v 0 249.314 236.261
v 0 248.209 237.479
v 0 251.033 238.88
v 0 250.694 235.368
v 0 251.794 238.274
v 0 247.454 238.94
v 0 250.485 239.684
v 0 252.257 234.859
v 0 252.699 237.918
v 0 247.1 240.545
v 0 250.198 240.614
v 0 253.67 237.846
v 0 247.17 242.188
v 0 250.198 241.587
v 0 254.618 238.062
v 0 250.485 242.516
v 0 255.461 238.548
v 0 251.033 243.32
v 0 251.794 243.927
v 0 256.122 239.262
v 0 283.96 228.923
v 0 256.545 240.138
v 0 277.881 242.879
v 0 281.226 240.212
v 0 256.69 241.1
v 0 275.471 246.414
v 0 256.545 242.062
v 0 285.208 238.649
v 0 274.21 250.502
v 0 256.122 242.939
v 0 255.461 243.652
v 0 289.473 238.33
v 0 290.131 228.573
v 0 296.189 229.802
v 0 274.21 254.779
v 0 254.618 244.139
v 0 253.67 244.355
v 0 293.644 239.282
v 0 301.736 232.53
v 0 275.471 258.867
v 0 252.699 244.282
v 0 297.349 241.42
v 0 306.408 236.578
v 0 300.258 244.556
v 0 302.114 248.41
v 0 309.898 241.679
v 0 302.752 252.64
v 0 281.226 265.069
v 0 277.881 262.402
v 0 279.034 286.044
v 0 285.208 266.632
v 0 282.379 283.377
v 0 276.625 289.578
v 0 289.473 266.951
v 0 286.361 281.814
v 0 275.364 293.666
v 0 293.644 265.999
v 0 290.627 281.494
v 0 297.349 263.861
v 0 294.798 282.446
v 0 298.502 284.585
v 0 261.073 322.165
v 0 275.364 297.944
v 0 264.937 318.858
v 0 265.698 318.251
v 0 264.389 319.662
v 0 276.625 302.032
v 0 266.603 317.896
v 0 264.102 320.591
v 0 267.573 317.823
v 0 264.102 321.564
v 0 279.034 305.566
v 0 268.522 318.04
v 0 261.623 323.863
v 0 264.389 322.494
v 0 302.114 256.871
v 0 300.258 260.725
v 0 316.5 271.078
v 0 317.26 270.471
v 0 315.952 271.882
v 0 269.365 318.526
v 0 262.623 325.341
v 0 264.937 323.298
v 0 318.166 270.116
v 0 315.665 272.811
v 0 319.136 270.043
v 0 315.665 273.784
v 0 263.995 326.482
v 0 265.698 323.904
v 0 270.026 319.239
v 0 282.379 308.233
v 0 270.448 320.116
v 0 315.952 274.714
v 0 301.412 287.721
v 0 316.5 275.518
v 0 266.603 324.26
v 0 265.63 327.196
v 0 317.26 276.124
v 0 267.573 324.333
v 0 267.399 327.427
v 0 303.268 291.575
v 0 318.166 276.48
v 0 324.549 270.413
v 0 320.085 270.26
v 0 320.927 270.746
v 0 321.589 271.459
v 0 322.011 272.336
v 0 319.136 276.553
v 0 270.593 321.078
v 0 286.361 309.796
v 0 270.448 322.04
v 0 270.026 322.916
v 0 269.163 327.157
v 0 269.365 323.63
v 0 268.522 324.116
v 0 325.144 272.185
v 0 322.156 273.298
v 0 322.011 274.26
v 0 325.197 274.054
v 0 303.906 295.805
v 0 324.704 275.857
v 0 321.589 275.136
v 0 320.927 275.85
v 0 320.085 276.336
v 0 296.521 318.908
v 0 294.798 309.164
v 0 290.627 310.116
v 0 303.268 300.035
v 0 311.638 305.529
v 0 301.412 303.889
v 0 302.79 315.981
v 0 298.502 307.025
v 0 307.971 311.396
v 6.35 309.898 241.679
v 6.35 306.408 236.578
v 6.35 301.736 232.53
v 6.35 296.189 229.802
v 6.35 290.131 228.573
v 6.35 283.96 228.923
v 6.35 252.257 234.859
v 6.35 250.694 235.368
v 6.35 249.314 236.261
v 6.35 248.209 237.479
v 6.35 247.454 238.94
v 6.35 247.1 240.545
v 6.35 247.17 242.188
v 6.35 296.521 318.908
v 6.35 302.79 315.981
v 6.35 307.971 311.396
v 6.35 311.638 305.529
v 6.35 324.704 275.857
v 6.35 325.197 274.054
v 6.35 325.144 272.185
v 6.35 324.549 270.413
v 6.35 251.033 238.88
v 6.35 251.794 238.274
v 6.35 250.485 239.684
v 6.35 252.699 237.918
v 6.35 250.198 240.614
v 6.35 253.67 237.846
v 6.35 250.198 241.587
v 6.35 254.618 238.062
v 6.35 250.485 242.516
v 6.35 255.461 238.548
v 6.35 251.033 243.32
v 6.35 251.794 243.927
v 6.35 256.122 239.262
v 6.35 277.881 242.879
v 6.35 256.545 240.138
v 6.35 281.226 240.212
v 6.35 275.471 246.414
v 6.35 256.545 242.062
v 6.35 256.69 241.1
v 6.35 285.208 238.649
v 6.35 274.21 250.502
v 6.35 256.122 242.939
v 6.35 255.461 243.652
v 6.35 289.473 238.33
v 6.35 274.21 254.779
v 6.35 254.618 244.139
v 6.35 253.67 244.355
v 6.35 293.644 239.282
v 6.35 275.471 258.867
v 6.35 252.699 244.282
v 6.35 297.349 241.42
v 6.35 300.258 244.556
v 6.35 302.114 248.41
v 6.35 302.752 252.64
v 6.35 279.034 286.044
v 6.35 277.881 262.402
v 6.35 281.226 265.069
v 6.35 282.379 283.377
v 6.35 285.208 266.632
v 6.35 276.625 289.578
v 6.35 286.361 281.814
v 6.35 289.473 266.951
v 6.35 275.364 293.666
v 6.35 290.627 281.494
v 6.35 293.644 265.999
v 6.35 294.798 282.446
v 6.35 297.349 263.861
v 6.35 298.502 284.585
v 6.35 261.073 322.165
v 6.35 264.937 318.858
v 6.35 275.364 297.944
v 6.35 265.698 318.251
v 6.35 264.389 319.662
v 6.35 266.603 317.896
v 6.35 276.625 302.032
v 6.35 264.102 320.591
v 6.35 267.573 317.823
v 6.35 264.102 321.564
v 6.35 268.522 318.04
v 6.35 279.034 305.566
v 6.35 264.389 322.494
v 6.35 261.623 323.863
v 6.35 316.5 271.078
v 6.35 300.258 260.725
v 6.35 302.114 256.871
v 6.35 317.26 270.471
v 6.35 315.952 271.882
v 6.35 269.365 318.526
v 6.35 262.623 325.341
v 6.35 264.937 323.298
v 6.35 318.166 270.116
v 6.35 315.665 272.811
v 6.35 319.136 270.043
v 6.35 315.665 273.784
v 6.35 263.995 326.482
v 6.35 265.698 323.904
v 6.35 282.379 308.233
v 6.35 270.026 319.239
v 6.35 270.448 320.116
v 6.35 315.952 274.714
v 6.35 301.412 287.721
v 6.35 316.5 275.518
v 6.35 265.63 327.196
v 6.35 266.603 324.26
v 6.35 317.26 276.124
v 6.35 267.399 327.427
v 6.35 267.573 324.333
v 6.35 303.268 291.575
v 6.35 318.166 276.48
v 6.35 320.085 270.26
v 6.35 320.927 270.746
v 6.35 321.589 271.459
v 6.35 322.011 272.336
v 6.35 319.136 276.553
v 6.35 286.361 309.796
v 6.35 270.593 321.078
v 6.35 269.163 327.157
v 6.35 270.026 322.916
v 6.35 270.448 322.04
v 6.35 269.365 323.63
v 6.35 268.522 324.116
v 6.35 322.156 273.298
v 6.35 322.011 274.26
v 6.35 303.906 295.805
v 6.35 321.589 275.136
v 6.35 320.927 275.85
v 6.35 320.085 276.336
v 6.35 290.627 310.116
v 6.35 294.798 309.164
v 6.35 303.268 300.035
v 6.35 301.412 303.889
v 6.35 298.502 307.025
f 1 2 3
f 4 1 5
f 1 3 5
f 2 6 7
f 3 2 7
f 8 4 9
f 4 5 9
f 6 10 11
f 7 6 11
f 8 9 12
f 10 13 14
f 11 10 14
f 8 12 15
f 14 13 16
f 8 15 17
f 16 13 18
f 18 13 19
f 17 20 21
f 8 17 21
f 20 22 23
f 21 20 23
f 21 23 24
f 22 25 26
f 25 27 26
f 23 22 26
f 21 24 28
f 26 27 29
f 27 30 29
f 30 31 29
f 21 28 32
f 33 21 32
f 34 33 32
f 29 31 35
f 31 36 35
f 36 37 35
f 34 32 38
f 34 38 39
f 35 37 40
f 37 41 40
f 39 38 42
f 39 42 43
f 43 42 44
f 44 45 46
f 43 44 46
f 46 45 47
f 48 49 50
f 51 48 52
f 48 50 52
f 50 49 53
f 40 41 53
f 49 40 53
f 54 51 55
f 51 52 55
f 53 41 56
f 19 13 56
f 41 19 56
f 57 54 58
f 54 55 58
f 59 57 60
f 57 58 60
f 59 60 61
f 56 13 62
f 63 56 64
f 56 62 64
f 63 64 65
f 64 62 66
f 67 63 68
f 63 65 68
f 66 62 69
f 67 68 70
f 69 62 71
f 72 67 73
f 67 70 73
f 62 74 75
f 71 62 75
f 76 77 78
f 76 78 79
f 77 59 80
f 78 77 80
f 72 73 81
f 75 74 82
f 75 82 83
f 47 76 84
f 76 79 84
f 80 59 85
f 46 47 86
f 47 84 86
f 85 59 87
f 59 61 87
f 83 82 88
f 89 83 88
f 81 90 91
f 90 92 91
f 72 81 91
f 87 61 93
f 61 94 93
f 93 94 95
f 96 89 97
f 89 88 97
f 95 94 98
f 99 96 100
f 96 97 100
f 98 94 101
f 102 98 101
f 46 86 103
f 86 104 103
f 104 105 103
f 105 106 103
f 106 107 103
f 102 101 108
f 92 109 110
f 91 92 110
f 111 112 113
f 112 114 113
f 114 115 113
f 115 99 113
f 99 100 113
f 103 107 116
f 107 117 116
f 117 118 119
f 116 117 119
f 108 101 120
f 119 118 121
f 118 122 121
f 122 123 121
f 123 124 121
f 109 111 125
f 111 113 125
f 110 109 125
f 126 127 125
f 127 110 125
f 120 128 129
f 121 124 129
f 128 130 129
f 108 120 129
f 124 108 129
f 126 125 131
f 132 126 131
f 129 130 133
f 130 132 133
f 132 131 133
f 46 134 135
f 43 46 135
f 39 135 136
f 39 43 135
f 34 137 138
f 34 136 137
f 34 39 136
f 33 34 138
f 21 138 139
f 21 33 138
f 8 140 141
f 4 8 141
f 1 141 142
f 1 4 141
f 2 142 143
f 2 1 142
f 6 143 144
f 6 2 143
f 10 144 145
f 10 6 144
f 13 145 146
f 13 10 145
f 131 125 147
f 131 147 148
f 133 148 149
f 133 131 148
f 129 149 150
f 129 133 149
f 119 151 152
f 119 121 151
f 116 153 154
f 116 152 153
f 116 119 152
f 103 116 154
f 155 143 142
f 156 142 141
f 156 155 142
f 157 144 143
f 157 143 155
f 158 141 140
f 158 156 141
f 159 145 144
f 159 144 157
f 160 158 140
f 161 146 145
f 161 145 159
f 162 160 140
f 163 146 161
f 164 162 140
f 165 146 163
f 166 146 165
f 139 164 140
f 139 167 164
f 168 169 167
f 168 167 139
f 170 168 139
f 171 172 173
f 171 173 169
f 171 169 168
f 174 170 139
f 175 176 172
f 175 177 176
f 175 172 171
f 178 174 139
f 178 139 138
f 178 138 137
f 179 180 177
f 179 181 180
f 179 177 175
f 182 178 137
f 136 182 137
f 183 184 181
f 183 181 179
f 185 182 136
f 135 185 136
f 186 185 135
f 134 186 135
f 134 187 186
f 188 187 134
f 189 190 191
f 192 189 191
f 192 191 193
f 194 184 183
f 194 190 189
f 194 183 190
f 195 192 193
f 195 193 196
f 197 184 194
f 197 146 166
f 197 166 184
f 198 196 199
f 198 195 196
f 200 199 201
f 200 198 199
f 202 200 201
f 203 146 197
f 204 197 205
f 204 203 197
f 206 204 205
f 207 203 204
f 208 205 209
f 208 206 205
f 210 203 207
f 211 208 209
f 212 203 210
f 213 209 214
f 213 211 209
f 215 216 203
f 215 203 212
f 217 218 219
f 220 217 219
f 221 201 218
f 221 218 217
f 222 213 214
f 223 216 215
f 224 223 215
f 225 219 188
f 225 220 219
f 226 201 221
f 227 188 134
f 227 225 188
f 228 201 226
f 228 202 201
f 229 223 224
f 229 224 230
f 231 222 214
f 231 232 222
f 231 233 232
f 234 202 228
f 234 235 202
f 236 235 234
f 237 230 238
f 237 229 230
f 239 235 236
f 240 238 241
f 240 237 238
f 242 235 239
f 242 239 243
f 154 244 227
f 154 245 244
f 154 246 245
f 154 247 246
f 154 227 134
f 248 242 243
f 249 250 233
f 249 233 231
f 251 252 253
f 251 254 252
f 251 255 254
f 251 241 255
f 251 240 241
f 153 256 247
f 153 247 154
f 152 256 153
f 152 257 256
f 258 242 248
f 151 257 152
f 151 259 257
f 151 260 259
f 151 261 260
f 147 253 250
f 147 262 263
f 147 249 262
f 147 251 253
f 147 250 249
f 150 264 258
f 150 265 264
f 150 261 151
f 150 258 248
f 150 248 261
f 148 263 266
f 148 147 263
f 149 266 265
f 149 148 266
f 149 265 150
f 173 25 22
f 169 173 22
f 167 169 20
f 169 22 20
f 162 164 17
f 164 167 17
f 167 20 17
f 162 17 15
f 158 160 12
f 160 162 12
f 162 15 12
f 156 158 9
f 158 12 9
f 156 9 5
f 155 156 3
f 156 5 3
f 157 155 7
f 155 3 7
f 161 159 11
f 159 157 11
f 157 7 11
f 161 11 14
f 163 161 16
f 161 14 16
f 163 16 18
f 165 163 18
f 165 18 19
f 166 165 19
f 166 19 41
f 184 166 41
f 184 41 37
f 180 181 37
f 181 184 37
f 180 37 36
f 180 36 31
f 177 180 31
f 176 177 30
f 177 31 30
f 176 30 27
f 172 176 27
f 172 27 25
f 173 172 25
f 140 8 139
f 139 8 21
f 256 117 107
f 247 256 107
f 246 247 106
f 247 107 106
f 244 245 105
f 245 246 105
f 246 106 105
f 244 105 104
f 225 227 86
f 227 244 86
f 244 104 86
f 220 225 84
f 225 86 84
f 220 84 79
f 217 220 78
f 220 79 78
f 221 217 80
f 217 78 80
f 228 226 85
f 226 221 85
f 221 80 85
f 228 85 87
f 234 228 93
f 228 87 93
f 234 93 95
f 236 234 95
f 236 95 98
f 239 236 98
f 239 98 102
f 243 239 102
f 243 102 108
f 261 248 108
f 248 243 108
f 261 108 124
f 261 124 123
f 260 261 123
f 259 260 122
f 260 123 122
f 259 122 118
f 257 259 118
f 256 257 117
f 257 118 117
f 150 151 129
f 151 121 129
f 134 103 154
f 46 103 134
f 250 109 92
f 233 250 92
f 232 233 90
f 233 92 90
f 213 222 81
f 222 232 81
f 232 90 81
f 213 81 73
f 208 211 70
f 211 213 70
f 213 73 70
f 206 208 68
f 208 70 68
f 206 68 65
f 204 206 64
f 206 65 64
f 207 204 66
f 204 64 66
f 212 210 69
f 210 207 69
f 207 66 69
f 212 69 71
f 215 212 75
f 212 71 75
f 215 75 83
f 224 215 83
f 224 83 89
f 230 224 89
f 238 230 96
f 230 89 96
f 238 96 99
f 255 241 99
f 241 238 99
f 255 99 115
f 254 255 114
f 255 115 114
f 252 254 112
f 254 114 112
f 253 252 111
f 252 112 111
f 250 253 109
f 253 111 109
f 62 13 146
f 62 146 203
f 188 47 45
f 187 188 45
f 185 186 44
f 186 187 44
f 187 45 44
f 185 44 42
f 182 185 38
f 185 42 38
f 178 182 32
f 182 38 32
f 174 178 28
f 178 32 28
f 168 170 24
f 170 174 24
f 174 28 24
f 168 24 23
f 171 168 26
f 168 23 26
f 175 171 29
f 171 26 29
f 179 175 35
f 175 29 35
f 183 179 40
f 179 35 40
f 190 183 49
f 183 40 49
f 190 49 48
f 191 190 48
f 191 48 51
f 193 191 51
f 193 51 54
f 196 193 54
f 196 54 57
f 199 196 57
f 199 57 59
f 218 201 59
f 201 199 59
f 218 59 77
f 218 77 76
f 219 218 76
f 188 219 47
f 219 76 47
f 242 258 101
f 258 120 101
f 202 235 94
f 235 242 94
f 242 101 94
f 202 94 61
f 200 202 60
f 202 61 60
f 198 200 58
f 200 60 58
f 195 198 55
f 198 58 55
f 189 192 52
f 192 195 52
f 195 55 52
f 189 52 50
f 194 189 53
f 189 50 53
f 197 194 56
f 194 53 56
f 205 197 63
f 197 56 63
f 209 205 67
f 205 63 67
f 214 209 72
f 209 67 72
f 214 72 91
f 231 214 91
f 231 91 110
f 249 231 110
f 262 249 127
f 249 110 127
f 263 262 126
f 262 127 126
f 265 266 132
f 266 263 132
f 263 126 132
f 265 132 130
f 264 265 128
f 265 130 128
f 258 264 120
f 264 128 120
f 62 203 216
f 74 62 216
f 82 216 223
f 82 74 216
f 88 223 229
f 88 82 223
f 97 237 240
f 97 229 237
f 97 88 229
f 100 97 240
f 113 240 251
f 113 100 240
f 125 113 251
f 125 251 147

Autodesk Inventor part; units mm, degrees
ref_plane "YZ Plane" through (0, 0, 0) normal (1, 0, 0) x (0, 1, 0)
ref_plane "XZ Plane" through (0, 0, 0) normal (0, 1, 0) x (-1, 0, 0)
ref_plane "XY Plane" through (0, 0, 0) normal (0, 0, 1) x (1, 0, 0)
sketch "Sketch1" plane through (0, 0, 0) normal (1, 0, 0) x (0, 1, 0)
  line L0 (95.25, 812.8) -> (44.45, 812.8) construction
  line L1 (44.45, 812.8) -> (44.45, 0) construction
  line L2 (44.45, 0) -> (95.25, 0) construction
  line L3 (95.25, 0) -> (95.25, 812.8) construction
  line L4 (95.25, 0) -> (44.45, 0) construction
  line L5 (44.45, 25.4) -> (95.25, 25.4) construction
  circle A0 centre (190.5, 0) radius 50.8 construction
  circle A1 centre (95.25, 279.4) radius 25.4 construction
  circle A2 centre (274.9493, 279.9916) radius 9.525 construction
  circle A3 centre (274.9493, 279.9916) radius 25.4 construction
  circle A4 centre (274.9493, 279.9916) radius 31.75 construction
  circle A5 centre (609.6, 438.15) radius 50.8 construction
  circle A6 centre (274.9493, 279.9916) radius 30.48 construction
  circle A7 centre (587.8333, 365.125) radius 25.4 construction
  circle A8 centre (587.8333, 511.175) radius 25.4 construction
  line L6 (587.8333, 485.775) -> (587.8333, 390.525) construction
  circle A9 centre (490.3356, 512.7625) radius 14.351 construction
  circle A10 centre (392.825, 512.7625) radius 14.351 construction
  circle A11 centre (490.3356, 363.5375) radius 14.351 construction
  line L7 (587.8333, 511.175) -> (490.3356, 512.7625) construction
  line L8 (587.8333, 365.125) -> (490.3356, 363.5375) construction
  circle A12 centre (490.3356, 512.7625) radius 25.4 construction
  circle A13 centre (490.3356, 363.5375) radius 25.4 construction
  line L9 (490.3356, 487.3625) -> (490.3356, 388.9375) construction
  circle A14 centre (392.825, 512.7625) radius 25.4 construction
  circle A15 centre (392.825, 363.5375) radius 25.4 construction
  circle A16 centre (392.825, 363.5375) radius 14.351 construction
  line L10 (490.3356, 512.7625) -> (392.825, 512.7625) construction
  line L11 (490.3356, 363.5375) -> (392.825, 363.5375) construction
  line L12 (392.825, 487.3625) -> (392.825, 388.9375) construction
  circle A17 centre (295.3189, 511.8309) radius 25.4 construction
  circle A18 centre (295.3189, 362.6059) radius 25.4 construction
  circle A19 centre (203.1597, 479.9719) radius 25.4 construction
  circle A20 centre (295.3189, 511.8309) radius 14.351 construction
  circle A21 centre (295.3189, 362.6059) radius 14.351 construction
  circle A22 centre (203.1597, 479.9719) radius 14.351 construction
  line L13 (392.825, 512.7625) -> (295.3189, 511.8309) construction
  line L14 (392.825, 363.5375) -> (295.3189, 362.6059) construction
  line L15 (295.3189, 486.4309) -> (295.3189, 388.0059) construction
  line L16 (295.3189, 511.8309) -> (203.1597, 479.9719) construction
  circle A23 centre (123.1487, 424.2353) radius 25.4 construction
  circle A24 centre (123.1487, 424.2353) radius 14.351 construction
  line L17 (203.1597, 479.9719) -> (123.1487, 424.2353) construction
  circle A25 centre (95.25, 279.4) radius 14.351 construction
  line L18 (609.6, 355.6) -> (44.45, 355.6) construction
  line L19 (44.45, 355.6) -> (44.45, 330.2) construction
  line L20 (44.45, 330.2) -> (609.6, 330.2) construction
  line L21 (609.6, 330.2) -> (609.6, 355.6) construction
  line L22 (95.25, 241.3) -> (44.45, 241.3) construction
  line L23 (44.45, 241.3) -> (44.45, 215.9) construction
  line L24 (44.45, 215.9) -> (95.25, 215.9) construction
  line L25 (95.25, 215.9) -> (95.25, 241.3) construction
  circle A26 centre (244.475, 279.4) radius 25.4 construction
  circle A27 centre (244.475, 279.4) radius 14.351 construction
  line L26 (218.8463, 459.9947) -> (279.6322, 382.5831) construction
  circle A28 centre (274.9493, 279.9916) radius 8.89 construction
  circle A29 centre (288.401, 252.6405) radius 21.59 construction
  circle A30 centre (244.475, 279.4) radius 21.59 construction
  circle A31 centre (288.401, 252.6405) radius 14.351
  circle A32 centre (587.8333, 511.175) radius 14.351 construction
  circle A33 centre (587.8333, 365.125) radius 14.351 construction
  line L27 (95.25, 647.7) -> (609.6, 647.7) construction
  line L28 (609.6, 647.7) -> (609.6, 622.3) construction
  line L29 (609.6, 622.3) -> (95.25, 622.3) construction
  line L30 (95.25, 622.3) -> (95.25, 647.7) construction
  circle A34 centre (600.5333, 552.45) radius 3.2639 construction
  circle A35 centre (600.5333, 552.45) radius 6.35 construction
  circle A36 centre (600.5333, 336.55) radius 3.2639 construction
  circle A37 centre (600.5333, 336.55) radius 6.35 construction
  circle A38 centre (114.3, 552.45) radius 3.2639 construction
  circle A39 centre (114.3, 552.45) radius 6.35 construction
  line L31 (595.3031, 535.4518) -> (598.6659, 546.3808) construction
  circle A40 centre (63.5, 264.8503) radius 3.2639 construction
  circle A41 centre (63.5, 264.8503) radius 6.35 construction
  line L32 (337.9424, 330.2) -> (600.5333, 330.2) construction
  circle A42 centre (288.401, 252.6405) radius 24.13 construction
  circle A43 centre (244.475, 279.4) radius 24.13 construction
  line L33 (72.1591, 268.8184) -> (69.2727, 267.4957) construction
  line L34 (609.6, 342.9) -> (44.45, 342.9) construction
  line L35 (265.0822, 266.8462) -> (267.7937, 265.1944) construction
  circle A44 centre (318.8924, 273.2978) radius 3.2639
  circle A45 centre (253.4257, 241.1003) radius 3.2639
  line L36 (95.25, 558.8) -> (44.45, 558.8) construction
  line L37 (44.45, 558.8) -> (44.45, 533.4) construction
  line L38 (44.45, 533.4) -> (95.25, 533.4) construction
  line L39 (95.25, 533.4) -> (95.25, 558.8) construction
  line L40 (114.3, 558.8) -> (600.5333, 558.8) construction
  line L41 (108.0468, 553.5545) -> (57.2468, 265.9549) construction
  line L42 (285.1949, 228.7245) -> (62.6563, 258.5566) construction
  circle A46 centre (318.8924, 273.2978) radius 6.35 construction
  circle A47 centre (253.4257, 241.1003) radius 6.35 construction
  arc A48 (114.3, 558.8) -> (108.0468, 553.5545) centre (114.3, 552.45) ccw construction
  arc A49 (57.2468, 265.9549) -> (62.6563, 258.5566) centre (63.5, 264.8503) ccw construction
  line L43 (312.6148, 274.2541) -> (306.3372, 275.2103) construction
  line L44 (313.6352, 269.7362) -> (308.3781, 266.1746) construction
  line L45 (259.4559, 243.09) -> (265.4861, 245.0797) construction
  line L46 (256.5005, 246.6562) -> (259.5753, 252.2121) construction
  line L47 (325.2424, 317.5) -> (325.2424, 273.2978) construction
  arc A50 (337.9424, 330.2) -> (325.2424, 317.5) centre (337.9424, 317.5) ccw construction
  line L48 (324.5494, 270.4133) -> (309.8976, 241.6792) construction
  arc A51 (324.5494, 270.4133) -> (325.2424, 273.2978) centre (318.8924, 273.2978) ccw construction
  arc A52 (285.1949, 228.7245) -> (309.8976, 241.6792) centre (288.401, 252.6405) ccw construction
  circle A53 centre (431.8, 342.9) radius 3.2639 construction
  circle A54 centre (457.2, 342.9) radius 3.2639 construction
  circle A55 centre (520.7, 342.9) radius 3.2639 construction
  circle A56 centre (546.1, 342.9) radius 3.2639 construction
  line L49 (606.8833, 552.45) -> (606.8833, 336.55) construction
  arc A57 (606.8833, 552.45) -> (600.5333, 558.8) centre (600.5333, 552.45) ccw construction
  arc A58 (600.5333, 330.2) -> (606.8833, 336.55) centre (600.5333, 336.55) ccw construction
  circle A59 centre (184.15, 304.8) radius 3.2639 construction
  circle A60 centre (158.75, 304.8) radius 3.2639 construction
  circle A61 centre (133.35, 304.8) radius 3.2639 construction
  circle A62 centre (133.35, 279.4) radius 3.2639 construction
  circle A63 centre (158.75, 279.4) radius 3.2639 construction
  circle A64 centre (184.15, 279.4) radius 3.2639 construction
  circle A65 centre (289.5545, 295.8051) radius 21.59 construction
  line L50 (313.8542, 277.163) -> (306.6842, 282.6636) construction
  circle A66 centre (289.5545, 295.8051) radius 14.351
  circle A67 centre (267.3295, 321.0778) radius 3.2639
  circle A68 centre (267.3295, 321.0778) radius 6.35 construction
  circle A69 centre (289.5545, 295.8051) radius 24.13 construction
  line L51 (271.5229, 316.3094) -> (273.6196, 313.9252) construction
  line L52 (252.257, 234.8587) -> (283.9601, 228.9227)
  line L53 (324.5494, 270.4133) -> (309.8976, 241.6792)
  arc A70 (283.9601, 228.9227) -> (309.8976, 241.6792) centre (288.401, 252.6405) ccw
  line L54 (247.1695, 242.1879) -> (261.0733, 322.1654)
  line L55 (269.1628, 327.1574) -> (296.521, 318.9076)
  line L56 (324.7039, 275.8568) -> (311.6384, 305.5292)
  arc A71 (311.6384, 305.5292) -> (296.521, 318.9076) centre (289.5545, 295.8051) ccw
  arc A72 (324.5494, 270.4133) -> (324.7039, 275.8568) centre (318.8924, 273.2978) ccw
  arc A73 (269.1628, 327.1574) -> (261.0733, 322.1654) centre (267.3295, 321.0778) ccw
  arc A74 (247.1695, 242.1879) -> (252.257, 234.8587) centre (253.4257, 241.1003) ccw
  point P0 (0, 0)
  point P1 (241.139, 234.6303)
  point P2 (100.4185, 253.4945)
  dimension "d9" = 50.8
  dimension "d38" = 50.8
  dimension "d53" = 50.8
  dimension "d178" = 43.18
  dimension "d1" = 812.8
  dimension "d2" = 44.45
  dimension "d4" = 25.4
  dimension "d5" = 101.6
  dimension "d6" = 95.25
  dimension "d8" = 50.8
  dimension "d14" = 50.8
  dimension "d15" = 63.5
  dimension "d21" = 19.05
  dimension "d29" = 438.15
  dimension "d30" = 514.35
  dimension "d36" = 60.96
  dimension "d39" = 50.8
  dimension "d41" = 95.25
  dimension "d45" = 28.702
  dimension "d47" = 97.5106
  dimension "d48" = 98.425
  dimension "d56" = 25.4
  dimension "d73" = 50.8
  dimension "d74" = 25.4
  dimension "d75" = 215.9
  dimension "d78" = 279.4
  dimension "d80" = 149.225
  dimension "d81" = 97.5106
  dimension "d82" = 147.4978
  dimension "d83" = 17.78
  dimension "d85" = 43.18
  dimension "d92" = 330.2
  dimension "d100" = 514.35
  dimension "d107" = 25.4
  dimension "d108" = 514.35
  dimension "d109" = 266.7
  dimension "d115" = 6.5278
  dimension "d116" = 12.7
  dimension "d122" = 2.54
  dimension "d123" = 2.54
  dimension "d128" = 3.175
  dimension "d134" = 3.175
  dimension "d135" = 194.9958
  dimension "d136" = 6.5278
  dimension "d137" = 25.4
  dimension "d138" = 533.4
  dimension "d139" = 19.05
  dimension "d140" = 19.05
  dimension "d141" = 12.7
  dimension "d142" = 6.35
  dimension "d143" = 12.7
  dimension "d144" = 43.18
  dimension "d149" = 25.4
  dimension "d151" = 6.5278
  dimension "d157" = 25.4
  dimension "d158" = 63.5
  dimension "d159" = 12.7
  dimension "d161" = 11.4347
  dimension "d163" = 44.45
  dimension "d164" = 38.1
  dimension "d166" = 336.55
  dimension "d167" = 25.4
  dimension "d168" = 6.5278
  dimension "d169" = 25.4
  dimension "d170" = 25.4
  dimension "d173" = 25.4
  dimension "d174" = 38.1
  dimension "d175" = 25.4
extrude "Extrusion2" add sketch "Sketch1" along normal blind 6.35
properties part number "INDX_012_OuterPlate" material "Polycarbonate, Clear"
